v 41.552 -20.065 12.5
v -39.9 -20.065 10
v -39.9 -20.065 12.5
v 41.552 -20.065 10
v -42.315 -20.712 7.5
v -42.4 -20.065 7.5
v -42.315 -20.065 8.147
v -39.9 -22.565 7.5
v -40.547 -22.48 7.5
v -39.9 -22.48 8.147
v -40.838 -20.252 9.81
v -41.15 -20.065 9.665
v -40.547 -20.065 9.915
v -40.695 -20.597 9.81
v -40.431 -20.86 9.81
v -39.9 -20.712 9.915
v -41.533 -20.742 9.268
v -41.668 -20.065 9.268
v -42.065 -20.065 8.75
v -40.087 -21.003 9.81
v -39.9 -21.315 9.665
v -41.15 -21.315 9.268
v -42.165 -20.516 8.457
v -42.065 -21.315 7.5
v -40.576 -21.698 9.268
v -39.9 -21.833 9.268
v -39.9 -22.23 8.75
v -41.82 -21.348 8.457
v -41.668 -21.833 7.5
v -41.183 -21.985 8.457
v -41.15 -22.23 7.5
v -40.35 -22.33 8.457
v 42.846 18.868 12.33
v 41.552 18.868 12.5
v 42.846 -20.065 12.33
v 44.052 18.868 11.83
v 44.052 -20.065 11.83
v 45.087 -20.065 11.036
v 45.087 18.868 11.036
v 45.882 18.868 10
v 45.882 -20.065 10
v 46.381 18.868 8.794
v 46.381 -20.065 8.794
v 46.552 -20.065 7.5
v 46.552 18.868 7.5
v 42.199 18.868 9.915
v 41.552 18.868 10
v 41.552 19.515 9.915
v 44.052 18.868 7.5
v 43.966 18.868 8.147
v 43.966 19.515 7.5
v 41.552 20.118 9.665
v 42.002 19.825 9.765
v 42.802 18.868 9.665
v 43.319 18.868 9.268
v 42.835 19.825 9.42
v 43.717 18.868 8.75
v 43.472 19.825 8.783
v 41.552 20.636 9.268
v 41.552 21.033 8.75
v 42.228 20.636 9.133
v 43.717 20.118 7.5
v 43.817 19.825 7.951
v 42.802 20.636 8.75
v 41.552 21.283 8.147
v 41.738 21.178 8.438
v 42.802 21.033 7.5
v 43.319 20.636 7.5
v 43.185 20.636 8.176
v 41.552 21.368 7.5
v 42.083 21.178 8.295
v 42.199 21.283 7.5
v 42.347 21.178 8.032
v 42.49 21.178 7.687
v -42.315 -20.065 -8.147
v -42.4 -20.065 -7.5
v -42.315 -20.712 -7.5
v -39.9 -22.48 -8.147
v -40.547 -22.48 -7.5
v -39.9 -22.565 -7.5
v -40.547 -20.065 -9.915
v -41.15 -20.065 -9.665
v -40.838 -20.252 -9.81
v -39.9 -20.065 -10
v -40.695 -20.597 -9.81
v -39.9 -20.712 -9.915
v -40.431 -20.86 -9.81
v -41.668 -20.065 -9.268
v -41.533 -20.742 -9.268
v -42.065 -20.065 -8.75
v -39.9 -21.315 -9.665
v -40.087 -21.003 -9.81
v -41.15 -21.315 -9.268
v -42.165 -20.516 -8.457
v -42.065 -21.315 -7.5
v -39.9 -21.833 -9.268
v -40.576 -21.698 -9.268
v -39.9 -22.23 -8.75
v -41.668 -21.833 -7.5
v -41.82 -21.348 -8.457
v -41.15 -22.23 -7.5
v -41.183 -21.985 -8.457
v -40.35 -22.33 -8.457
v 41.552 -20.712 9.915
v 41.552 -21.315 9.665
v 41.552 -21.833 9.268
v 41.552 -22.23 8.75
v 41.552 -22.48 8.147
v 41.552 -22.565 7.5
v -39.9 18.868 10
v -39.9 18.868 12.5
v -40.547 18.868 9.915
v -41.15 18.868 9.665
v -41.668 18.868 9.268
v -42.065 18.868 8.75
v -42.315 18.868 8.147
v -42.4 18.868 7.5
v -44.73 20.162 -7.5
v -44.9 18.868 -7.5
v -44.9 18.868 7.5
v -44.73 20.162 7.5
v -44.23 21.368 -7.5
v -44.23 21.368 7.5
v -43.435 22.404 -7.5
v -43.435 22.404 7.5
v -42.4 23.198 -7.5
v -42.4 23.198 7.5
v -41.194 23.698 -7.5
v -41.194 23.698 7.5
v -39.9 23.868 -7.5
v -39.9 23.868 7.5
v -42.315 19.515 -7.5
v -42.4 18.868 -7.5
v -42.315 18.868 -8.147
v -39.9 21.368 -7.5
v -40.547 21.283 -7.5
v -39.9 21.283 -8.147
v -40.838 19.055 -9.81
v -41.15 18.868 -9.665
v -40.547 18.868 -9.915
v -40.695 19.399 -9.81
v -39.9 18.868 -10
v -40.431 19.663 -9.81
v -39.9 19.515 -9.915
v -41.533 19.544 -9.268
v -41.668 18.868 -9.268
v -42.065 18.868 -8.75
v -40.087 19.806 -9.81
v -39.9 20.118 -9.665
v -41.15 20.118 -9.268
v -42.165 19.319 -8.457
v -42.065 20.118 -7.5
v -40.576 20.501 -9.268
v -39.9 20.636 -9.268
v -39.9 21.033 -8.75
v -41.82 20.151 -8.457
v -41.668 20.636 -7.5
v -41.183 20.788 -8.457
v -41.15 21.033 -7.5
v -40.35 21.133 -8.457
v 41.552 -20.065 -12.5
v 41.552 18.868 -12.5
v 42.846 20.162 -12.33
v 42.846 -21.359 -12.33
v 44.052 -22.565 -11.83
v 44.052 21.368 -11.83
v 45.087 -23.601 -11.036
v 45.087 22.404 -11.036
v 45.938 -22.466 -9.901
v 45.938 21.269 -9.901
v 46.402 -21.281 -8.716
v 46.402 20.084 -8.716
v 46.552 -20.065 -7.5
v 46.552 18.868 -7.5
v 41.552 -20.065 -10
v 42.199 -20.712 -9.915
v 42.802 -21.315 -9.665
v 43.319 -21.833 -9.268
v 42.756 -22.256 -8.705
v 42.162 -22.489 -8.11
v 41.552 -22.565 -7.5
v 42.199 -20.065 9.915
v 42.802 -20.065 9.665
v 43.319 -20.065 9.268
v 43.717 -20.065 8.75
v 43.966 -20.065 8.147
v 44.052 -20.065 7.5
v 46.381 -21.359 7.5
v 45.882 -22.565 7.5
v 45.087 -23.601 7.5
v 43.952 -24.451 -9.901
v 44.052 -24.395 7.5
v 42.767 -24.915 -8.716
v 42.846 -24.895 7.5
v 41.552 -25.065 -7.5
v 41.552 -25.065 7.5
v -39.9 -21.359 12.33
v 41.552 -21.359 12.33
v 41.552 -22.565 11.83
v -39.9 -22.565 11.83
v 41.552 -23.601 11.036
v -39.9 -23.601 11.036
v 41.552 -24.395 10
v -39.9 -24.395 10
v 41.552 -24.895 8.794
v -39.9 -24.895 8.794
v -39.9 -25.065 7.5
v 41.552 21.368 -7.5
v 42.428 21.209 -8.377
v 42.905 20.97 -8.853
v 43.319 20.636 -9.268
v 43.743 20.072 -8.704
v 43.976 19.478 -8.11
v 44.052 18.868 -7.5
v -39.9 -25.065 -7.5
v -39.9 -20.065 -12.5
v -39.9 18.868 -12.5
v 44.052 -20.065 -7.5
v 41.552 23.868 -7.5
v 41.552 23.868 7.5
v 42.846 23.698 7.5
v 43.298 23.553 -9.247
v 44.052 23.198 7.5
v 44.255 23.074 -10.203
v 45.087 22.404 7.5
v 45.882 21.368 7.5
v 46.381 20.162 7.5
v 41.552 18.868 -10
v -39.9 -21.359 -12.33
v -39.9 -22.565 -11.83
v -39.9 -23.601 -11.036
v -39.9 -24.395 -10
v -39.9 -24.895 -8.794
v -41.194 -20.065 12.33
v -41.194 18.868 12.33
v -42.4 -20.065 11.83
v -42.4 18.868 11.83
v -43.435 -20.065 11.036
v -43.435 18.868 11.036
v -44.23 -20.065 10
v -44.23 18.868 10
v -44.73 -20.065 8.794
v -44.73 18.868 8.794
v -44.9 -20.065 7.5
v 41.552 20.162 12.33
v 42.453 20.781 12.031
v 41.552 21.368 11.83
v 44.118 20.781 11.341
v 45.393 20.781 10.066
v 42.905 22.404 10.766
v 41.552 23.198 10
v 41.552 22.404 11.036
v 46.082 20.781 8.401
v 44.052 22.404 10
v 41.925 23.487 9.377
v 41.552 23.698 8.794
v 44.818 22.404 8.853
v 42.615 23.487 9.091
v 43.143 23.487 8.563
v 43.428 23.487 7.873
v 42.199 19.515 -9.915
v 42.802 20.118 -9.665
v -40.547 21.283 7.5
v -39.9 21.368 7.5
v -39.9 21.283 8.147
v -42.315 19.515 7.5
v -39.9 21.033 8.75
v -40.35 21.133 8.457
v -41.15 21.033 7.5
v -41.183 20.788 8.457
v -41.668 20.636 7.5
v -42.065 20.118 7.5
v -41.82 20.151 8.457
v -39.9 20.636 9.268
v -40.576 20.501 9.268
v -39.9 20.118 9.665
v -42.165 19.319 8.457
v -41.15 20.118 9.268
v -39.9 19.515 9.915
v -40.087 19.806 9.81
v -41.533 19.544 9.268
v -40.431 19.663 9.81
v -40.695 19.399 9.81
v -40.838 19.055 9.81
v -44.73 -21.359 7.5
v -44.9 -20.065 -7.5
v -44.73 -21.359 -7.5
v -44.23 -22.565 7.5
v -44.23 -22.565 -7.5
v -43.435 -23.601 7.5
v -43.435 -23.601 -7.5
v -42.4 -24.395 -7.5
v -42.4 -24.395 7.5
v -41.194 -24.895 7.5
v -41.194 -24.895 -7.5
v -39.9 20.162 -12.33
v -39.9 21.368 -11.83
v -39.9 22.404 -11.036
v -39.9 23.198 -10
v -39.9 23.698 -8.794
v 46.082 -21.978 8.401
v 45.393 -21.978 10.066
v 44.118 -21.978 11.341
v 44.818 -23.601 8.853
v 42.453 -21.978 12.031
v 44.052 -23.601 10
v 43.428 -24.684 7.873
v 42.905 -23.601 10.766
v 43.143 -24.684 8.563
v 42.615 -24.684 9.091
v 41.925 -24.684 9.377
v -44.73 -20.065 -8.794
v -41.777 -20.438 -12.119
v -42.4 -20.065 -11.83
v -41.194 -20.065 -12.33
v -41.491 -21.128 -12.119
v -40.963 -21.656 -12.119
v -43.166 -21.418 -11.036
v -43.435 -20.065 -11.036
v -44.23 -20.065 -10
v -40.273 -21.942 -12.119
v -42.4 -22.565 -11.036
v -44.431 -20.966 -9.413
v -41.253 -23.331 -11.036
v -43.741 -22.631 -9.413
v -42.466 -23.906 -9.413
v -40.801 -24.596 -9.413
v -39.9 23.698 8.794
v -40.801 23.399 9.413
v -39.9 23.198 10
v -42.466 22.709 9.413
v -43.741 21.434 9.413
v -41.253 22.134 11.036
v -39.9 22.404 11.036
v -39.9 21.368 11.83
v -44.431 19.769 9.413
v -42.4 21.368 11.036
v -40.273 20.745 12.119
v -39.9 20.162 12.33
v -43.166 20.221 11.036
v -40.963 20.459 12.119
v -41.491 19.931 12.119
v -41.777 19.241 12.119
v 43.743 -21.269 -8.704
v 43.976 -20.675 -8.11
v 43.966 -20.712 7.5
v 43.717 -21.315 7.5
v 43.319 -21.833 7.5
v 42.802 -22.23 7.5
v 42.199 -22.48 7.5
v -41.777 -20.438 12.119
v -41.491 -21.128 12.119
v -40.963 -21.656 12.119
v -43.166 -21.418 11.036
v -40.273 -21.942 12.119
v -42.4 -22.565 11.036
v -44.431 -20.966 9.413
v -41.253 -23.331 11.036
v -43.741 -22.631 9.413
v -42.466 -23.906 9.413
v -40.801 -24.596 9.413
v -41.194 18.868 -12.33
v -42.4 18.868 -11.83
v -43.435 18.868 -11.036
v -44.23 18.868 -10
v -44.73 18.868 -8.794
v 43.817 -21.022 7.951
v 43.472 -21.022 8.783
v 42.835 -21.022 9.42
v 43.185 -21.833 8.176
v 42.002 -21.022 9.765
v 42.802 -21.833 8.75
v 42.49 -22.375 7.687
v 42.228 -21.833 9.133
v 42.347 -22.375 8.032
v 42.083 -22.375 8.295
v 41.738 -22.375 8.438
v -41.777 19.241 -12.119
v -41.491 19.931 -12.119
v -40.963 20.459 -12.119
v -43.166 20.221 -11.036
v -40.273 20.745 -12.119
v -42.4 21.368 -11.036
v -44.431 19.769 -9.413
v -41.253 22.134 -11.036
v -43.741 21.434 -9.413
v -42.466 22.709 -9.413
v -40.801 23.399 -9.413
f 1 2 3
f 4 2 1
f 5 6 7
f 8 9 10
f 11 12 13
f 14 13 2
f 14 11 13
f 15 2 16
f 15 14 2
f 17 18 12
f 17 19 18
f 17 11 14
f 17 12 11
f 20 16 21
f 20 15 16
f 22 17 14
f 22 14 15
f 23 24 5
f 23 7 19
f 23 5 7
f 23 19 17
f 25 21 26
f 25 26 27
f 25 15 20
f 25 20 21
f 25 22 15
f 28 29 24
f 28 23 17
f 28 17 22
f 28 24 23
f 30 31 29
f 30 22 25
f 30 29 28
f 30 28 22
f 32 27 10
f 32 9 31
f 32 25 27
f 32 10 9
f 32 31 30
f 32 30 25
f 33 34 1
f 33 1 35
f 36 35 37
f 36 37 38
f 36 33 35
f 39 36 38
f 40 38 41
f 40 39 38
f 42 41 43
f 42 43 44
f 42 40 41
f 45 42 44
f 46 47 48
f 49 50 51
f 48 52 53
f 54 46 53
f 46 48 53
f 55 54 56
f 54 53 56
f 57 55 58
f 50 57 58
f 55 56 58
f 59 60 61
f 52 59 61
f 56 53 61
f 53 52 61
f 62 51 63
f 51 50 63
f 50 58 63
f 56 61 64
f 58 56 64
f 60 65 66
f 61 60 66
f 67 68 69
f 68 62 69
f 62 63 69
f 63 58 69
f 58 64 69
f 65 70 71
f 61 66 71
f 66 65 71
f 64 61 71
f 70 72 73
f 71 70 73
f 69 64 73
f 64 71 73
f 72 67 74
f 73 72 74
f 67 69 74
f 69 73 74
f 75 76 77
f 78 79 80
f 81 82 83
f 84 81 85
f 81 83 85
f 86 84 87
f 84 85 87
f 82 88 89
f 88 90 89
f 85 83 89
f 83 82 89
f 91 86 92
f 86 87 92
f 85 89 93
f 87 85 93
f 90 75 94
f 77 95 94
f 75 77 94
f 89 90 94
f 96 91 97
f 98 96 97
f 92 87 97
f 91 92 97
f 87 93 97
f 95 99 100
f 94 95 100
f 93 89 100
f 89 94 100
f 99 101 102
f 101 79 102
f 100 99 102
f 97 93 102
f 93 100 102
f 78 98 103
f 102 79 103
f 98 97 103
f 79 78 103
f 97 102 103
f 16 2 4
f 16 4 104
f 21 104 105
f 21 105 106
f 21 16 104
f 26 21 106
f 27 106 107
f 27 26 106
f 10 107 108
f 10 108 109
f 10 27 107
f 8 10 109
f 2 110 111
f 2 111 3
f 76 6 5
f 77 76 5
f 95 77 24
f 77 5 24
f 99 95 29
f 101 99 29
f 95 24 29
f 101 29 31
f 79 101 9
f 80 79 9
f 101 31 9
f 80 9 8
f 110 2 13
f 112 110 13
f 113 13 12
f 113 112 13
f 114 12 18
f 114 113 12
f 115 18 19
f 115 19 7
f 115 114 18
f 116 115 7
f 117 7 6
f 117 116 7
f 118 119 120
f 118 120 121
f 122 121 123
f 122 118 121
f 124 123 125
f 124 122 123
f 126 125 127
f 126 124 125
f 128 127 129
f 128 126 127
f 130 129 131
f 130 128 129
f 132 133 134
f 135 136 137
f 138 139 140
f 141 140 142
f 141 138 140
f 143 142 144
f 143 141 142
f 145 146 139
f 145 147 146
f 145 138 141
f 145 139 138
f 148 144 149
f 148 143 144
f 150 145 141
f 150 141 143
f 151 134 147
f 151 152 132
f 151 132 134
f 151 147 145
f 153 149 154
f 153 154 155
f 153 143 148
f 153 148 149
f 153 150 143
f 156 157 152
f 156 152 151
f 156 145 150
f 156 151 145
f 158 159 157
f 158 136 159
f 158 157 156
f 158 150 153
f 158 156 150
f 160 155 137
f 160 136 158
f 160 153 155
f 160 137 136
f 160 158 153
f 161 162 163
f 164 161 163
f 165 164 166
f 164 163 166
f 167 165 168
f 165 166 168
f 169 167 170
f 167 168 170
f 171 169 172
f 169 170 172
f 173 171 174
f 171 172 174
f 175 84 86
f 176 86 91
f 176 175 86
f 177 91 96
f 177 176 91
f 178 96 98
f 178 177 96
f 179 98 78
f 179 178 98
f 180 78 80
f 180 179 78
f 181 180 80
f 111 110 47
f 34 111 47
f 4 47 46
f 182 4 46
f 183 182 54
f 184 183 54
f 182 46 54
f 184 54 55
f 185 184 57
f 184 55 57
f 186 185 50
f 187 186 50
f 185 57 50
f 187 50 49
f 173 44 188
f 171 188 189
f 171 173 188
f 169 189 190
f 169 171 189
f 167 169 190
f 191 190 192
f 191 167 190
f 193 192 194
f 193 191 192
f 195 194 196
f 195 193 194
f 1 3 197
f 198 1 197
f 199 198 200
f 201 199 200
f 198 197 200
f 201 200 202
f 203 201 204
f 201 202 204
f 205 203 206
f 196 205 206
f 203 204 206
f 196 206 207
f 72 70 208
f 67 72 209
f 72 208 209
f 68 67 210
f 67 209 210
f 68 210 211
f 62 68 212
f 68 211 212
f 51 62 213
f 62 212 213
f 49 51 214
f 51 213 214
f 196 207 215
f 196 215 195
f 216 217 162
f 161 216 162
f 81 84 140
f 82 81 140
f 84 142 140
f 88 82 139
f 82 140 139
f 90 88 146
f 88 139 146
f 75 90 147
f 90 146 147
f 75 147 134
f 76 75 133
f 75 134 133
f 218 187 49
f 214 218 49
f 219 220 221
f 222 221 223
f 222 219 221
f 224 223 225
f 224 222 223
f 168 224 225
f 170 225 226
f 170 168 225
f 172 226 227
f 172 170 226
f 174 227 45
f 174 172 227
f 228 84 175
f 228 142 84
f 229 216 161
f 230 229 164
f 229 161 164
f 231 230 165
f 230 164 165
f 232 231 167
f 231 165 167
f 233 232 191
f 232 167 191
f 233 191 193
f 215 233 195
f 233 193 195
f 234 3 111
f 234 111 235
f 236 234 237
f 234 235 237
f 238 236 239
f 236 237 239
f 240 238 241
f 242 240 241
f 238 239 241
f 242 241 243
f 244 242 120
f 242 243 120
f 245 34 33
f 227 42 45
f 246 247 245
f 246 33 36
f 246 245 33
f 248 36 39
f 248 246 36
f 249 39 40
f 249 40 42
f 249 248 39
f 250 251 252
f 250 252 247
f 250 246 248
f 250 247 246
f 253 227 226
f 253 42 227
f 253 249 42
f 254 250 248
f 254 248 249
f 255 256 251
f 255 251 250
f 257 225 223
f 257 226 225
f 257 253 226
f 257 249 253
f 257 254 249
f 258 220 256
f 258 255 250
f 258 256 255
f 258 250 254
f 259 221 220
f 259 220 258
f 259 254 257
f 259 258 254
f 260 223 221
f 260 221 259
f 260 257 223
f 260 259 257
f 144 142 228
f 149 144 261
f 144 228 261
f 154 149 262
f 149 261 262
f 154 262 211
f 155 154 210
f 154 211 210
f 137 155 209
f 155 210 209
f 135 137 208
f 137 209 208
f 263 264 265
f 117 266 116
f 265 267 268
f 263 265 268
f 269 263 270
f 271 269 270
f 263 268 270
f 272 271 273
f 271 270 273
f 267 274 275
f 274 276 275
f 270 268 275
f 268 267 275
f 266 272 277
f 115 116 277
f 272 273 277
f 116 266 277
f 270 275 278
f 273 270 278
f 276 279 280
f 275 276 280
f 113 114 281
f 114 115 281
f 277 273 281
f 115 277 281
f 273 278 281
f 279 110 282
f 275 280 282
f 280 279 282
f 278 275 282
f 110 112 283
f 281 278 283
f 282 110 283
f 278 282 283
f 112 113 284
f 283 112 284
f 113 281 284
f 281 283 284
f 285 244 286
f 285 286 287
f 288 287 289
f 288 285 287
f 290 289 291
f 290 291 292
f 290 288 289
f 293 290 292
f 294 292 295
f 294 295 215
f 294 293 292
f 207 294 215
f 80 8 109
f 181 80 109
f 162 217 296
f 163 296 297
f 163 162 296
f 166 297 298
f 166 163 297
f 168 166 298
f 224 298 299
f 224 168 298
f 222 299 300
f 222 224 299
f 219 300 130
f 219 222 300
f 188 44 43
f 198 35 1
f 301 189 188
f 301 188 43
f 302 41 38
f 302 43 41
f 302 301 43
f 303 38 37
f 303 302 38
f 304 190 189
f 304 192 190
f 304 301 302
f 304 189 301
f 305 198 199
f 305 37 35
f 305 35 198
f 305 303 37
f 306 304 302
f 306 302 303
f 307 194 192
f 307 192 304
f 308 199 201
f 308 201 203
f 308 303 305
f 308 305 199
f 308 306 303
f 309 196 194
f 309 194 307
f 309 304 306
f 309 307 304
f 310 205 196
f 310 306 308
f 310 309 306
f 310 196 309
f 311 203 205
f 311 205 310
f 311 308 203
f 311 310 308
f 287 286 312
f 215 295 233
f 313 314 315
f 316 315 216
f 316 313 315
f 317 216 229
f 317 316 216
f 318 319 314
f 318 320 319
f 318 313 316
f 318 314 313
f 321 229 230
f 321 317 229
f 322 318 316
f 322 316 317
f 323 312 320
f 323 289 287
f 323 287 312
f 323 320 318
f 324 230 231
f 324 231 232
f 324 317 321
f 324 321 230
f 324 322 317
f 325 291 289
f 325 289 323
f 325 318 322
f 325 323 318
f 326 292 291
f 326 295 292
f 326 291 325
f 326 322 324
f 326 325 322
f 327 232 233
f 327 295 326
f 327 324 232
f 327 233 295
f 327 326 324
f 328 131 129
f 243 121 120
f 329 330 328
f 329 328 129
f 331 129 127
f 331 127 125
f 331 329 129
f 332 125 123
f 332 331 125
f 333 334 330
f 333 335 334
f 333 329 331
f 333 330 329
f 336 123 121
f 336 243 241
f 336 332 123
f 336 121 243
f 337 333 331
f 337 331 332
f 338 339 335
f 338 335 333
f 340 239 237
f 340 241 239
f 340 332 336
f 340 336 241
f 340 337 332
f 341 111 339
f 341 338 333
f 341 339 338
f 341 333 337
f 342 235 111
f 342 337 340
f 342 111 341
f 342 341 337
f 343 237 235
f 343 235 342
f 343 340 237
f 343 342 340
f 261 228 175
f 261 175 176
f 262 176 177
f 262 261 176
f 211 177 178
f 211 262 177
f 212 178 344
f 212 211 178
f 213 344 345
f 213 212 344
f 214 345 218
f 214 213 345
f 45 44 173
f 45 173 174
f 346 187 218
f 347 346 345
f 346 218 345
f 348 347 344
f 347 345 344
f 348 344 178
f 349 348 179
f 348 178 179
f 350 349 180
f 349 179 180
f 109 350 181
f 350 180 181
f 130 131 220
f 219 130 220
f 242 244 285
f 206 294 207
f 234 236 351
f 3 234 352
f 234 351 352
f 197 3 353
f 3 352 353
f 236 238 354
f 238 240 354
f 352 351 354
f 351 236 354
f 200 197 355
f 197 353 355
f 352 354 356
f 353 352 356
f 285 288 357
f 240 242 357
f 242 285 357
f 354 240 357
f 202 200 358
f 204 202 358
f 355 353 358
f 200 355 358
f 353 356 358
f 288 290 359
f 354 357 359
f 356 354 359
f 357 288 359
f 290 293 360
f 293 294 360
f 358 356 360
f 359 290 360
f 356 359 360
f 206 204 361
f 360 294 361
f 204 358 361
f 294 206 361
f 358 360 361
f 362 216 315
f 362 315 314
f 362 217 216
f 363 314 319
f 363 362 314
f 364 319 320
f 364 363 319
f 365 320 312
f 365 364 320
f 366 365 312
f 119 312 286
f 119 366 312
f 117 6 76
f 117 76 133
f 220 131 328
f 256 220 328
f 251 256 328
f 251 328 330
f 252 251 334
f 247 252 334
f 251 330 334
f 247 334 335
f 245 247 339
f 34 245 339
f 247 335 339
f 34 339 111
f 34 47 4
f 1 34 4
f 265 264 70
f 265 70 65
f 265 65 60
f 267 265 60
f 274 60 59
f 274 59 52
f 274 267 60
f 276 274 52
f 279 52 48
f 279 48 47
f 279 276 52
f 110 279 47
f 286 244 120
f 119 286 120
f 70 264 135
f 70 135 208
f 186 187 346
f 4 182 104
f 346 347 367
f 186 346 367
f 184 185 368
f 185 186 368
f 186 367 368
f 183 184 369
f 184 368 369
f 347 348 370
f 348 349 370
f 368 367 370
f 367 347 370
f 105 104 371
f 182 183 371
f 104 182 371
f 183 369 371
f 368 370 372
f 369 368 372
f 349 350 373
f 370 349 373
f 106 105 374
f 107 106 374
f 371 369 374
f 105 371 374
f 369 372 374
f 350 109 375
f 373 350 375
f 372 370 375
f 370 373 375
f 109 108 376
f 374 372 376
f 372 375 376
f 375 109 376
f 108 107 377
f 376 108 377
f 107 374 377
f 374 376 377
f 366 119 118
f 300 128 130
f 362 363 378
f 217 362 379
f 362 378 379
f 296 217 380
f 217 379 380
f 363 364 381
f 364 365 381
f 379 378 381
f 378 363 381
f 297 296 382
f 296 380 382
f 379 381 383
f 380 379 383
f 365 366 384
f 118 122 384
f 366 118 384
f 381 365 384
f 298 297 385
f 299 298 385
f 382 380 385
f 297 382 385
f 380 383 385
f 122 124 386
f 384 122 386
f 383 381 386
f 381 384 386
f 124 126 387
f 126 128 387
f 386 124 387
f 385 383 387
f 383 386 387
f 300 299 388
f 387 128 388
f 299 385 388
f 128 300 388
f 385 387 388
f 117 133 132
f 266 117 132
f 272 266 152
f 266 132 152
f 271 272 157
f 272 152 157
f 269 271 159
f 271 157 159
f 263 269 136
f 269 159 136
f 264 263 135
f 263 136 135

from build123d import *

# Parameters (mm, degrees)
F0_W         = 91.4515480399
F0_H         = 48.9329919219
F1_DEPTH     = 12.5
F2_R         = 5
F3_R         = 5
F4_T1_DEPTH  = 27.5
F4_T3_DEPTH  = 38.9329919219
F4_T5_DEPTH  = 81.4515480399
F4_S9_W      = 5.1
F4_S9_H      = 5.1
F4_T10_DEPTH = 5.1
F4_S15_W     = 5.1
F4_S15_H     = 5.1
F4_T16_DEPTH = 5.1
F4_T20_ANGLE = 90
F4_T22_ANGLE = 90
F5_T         = -2.5


# Not quite as in the source:
# - a fillet or chamfer that OpenCascade refuses, or shapes differently, is made with other operations: its cross-section is extruded or revolved along the edge and cut away or added
# - a shell that OpenCascade refuses in one call is made with other operations: the cavity is built on its own and cut out


with BuildPart() as f1:
    # F0 (on Top) → F1 (new body, symmetric)
    with BuildSketch(Plane.XY):
        with Locations((0.825881958, -0.5985237658)):
            Rectangle(F0_W, F0_H)
    extrude(amount=F1_DEPTH, both=True)

    # F2
    f2_edges = [f1.edges().sort_by_distance(p)[0] for p in [
        (-44.899892, 23.867972, 0),
    ]]
    fillet(f2_edges, radius=F2_R)

    # F3
    f3_edges = [f1.edges().sort_by_distance(p)[0] for p in [
        (-44.899892, -25.06502, 0),
        (3.325882, 23.867972, -12.5),
        (-43.435426, 22.403506, -12.5),
        (46.551656, -0.598524, -12.5),
        (-44.899892, -3.098524, -12.5),
        (0.825882, -25.06502, -12.5),
    ]]
    fillet(f3_edges, radius=F3_R)

    # F4: fillet of radius 5 on 9 edges, made by hand

    # F4_s2 → F4_t1 (cut)
    with BuildSketch(Plane.XY.offset(-20)):
        with BuildLine():
            ThreePointArc((41.551655978, 23.8679721951), (45.0871898839, 22.4035061011), (46.551655978, 18.8679721951))
            Line((46.551655978, 18.8679721951), (46.551655978, 23.8679721951))
            Line((46.551655978, 23.8679721951), (41.551655978, 23.8679721951))
        make_face()
        with BuildLine():
            ThreePointArc((46.551655978, -20.0650197268), (45.0871898839, -23.6005536327), (41.551655978, -25.0650197268))
            Line((41.551655978, -25.0650197268), (46.551655978, -25.0650197268))
            Line((46.551655978, -25.0650197268), (46.551655978, -20.0650197268))
        make_face()
    extrude(amount=F4_T1_DEPTH, mode=Mode.SUBTRACT)

    # F4_s4 → F4_t3 (cut)
    with BuildSketch(Plane.XZ.offset(-18.8679721951)):
        with BuildLine():
            ThreePointArc((41.551655978, 12.5), (45.0871898839, 11.0355339059), (46.551655978, 7.5))
            Line((46.551655978, 7.5), (46.551655978, 12.5))
            Line((46.551655978, 12.5), (41.551655978, 12.5))
        make_face()
        with BuildLine():
            ThreePointArc((-39.8998920619, 12.5), (-43.4354259679, 11.0355339059), (-44.8998920619, 7.5))
            Line((-44.8998920619, 7.5), (-44.8998920619, 12.5))
            Line((-44.8998920619, 12.5), (-39.8998920619, 12.5))
        make_face()
    extrude(amount=F4_T3_DEPTH, mode=Mode.SUBTRACT)

    # F4_s6 → F4_t5 (cut)
    with BuildSketch(Plane.YZ.offset(-39.8998920619)):
        with BuildLine():
            ThreePointArc((23.8679721951, 7.5), (22.4035061011, 11.0355339059), (18.8679721951, 12.5))
            Line((18.8679721951, 12.5), (23.8679721951, 12.5))
            Line((23.8679721951, 12.5), (23.8679721951, 7.5))
        make_face()
        with BuildLine():
            ThreePointArc((-20.0650197268, 12.5), (-23.6005536327, 11.0355339059), (-25.0650197268, 7.5))
            Line((-25.0650197268, 7.5), (-25.0650197268, 12.5))
            Line((-25.0650197268, 12.5), (-20.0650197268, 12.5))
        make_face()
    extrude(amount=F4_T5_DEPTH, mode=Mode.SUBTRACT)


with BuildPart() as f4_tool8:
    # F4_s9 → F4_t10 (new body)
    with BuildSketch(Plane.XZ.offset(-18.8679721951)):
        with Locations((44.101655978, 10.05)):
            Rectangle(F4_S9_W, F4_S9_H)
    extrude(amount=-F4_T10_DEPTH)

    # F4_s11 → F4_t12 (revolve, cut)
    with BuildSketch(Plane(origin=(41.551655978, 18.8679721951, 7.5), x_dir=(-0.7071067812, 0, -0.7071067812), z_dir=(0.7071067812, 0, -0.7071067812))):
        with BuildLine():
            ThreePointArc((0, -5), (5, 0), (0, 5))
            Line((0, 5), (0, -5))
        make_face()
    revolve(axis=Axis((41.551655978, 18.8679721951, 7.5), (0, 1, 0)), mode=Mode.SUBTRACT)


with BuildPart() as f1_1:
    add(f1.part)

    # F4_t7: cut F4_tool8
    add(f4_tool8.part, mode=Mode.SUBTRACT)


with BuildPart() as f4_tool14:
    # F4_s15 → F4_t16 (new body)
    with BuildSketch(Plane.XZ.offset(20.0650197268)):
        with Locations((44.101655978, 10.05)):
            Rectangle(F4_S15_W, F4_S15_H)
    extrude(amount=F4_T16_DEPTH)

    # F4_s17 → F4_t18 (revolve, cut)
    with BuildSketch(Plane(origin=(41.551655978, -20.0650197268, 7.5), x_dir=(-0.7071067812, 0, -0.7071067812), z_dir=(-0.7071067812, 0, 0.7071067812))):
        with BuildLine():
            ThreePointArc((0, -5), (5, 0), (0, 5))
            Line((0, 5), (0, -5))
        make_face()
    revolve(axis=Axis((41.551655978, -20.0650197268, 7.5), (0, -1, 0)), mode=Mode.SUBTRACT)


with BuildPart() as f1_2:
    add(f1_1.part)

    # F4_t13: cut F4_tool14
    add(f4_tool14.part, mode=Mode.SUBTRACT)

    # F4_s19 → F4_t20 (revolve, cut)
    with BuildSketch(Plane.YZ.offset(-39.8998920619)):
        with BuildLine():
            ThreePointArc((23.8679721951, 7.5), (22.4035061011, 11.0355339059), (18.8679721951, 12.5))
            Line((18.8679721951, 12.5), (23.8679721951, 12.5))
            Line((23.8679721951, 12.5), (23.8679721951, 7.5))
        make_face()
    revolve(axis=Axis((-39.8998920619, 18.8679721951, 12.5), (0, 0, 1)), revolution_arc=F4_T20_ANGLE, mode=Mode.SUBTRACT)

    # F4_s21 → F4_t22 (revolve, cut)
    with BuildSketch(Plane.XZ.offset(20.0650197268)):
        with BuildLine():
            ThreePointArc((-39.8998920619, 12.5), (-43.4354259679, 11.0355339059), (-44.8998920619, 7.5))
            Line((-44.8998920619, 7.5), (-44.8998920619, 12.5))
            Line((-44.8998920619, 12.5), (-39.8998920619, 12.5))
        make_face()
    revolve(axis=Axis((-39.8998920619, -20.0650197268, 12.5), (0, 0, 1)), revolution_arc=F4_T22_ANGLE, mode=Mode.SUBTRACT)

    # F5: a shell. OpenCascade refuses it in one call, so the cavity is built on its own and cut out:
    # the body offset inwards by the wall thickness, plus a prism from it out through each open face.
    f5_core = offset(f1_2.part, amount=F5_T, mode=Mode.PRIVATE)
    f5_exits = [f5_core.faces().sort_by_distance(p)[0] for p in [
        (0.825882, -0.598524, 10),
    ]]
    add(f5_core, mode=Mode.SUBTRACT)
    extrude(f5_exits, amount=-F5_T, mode=Mode.SUBTRACT)


solid = f1_2.part
